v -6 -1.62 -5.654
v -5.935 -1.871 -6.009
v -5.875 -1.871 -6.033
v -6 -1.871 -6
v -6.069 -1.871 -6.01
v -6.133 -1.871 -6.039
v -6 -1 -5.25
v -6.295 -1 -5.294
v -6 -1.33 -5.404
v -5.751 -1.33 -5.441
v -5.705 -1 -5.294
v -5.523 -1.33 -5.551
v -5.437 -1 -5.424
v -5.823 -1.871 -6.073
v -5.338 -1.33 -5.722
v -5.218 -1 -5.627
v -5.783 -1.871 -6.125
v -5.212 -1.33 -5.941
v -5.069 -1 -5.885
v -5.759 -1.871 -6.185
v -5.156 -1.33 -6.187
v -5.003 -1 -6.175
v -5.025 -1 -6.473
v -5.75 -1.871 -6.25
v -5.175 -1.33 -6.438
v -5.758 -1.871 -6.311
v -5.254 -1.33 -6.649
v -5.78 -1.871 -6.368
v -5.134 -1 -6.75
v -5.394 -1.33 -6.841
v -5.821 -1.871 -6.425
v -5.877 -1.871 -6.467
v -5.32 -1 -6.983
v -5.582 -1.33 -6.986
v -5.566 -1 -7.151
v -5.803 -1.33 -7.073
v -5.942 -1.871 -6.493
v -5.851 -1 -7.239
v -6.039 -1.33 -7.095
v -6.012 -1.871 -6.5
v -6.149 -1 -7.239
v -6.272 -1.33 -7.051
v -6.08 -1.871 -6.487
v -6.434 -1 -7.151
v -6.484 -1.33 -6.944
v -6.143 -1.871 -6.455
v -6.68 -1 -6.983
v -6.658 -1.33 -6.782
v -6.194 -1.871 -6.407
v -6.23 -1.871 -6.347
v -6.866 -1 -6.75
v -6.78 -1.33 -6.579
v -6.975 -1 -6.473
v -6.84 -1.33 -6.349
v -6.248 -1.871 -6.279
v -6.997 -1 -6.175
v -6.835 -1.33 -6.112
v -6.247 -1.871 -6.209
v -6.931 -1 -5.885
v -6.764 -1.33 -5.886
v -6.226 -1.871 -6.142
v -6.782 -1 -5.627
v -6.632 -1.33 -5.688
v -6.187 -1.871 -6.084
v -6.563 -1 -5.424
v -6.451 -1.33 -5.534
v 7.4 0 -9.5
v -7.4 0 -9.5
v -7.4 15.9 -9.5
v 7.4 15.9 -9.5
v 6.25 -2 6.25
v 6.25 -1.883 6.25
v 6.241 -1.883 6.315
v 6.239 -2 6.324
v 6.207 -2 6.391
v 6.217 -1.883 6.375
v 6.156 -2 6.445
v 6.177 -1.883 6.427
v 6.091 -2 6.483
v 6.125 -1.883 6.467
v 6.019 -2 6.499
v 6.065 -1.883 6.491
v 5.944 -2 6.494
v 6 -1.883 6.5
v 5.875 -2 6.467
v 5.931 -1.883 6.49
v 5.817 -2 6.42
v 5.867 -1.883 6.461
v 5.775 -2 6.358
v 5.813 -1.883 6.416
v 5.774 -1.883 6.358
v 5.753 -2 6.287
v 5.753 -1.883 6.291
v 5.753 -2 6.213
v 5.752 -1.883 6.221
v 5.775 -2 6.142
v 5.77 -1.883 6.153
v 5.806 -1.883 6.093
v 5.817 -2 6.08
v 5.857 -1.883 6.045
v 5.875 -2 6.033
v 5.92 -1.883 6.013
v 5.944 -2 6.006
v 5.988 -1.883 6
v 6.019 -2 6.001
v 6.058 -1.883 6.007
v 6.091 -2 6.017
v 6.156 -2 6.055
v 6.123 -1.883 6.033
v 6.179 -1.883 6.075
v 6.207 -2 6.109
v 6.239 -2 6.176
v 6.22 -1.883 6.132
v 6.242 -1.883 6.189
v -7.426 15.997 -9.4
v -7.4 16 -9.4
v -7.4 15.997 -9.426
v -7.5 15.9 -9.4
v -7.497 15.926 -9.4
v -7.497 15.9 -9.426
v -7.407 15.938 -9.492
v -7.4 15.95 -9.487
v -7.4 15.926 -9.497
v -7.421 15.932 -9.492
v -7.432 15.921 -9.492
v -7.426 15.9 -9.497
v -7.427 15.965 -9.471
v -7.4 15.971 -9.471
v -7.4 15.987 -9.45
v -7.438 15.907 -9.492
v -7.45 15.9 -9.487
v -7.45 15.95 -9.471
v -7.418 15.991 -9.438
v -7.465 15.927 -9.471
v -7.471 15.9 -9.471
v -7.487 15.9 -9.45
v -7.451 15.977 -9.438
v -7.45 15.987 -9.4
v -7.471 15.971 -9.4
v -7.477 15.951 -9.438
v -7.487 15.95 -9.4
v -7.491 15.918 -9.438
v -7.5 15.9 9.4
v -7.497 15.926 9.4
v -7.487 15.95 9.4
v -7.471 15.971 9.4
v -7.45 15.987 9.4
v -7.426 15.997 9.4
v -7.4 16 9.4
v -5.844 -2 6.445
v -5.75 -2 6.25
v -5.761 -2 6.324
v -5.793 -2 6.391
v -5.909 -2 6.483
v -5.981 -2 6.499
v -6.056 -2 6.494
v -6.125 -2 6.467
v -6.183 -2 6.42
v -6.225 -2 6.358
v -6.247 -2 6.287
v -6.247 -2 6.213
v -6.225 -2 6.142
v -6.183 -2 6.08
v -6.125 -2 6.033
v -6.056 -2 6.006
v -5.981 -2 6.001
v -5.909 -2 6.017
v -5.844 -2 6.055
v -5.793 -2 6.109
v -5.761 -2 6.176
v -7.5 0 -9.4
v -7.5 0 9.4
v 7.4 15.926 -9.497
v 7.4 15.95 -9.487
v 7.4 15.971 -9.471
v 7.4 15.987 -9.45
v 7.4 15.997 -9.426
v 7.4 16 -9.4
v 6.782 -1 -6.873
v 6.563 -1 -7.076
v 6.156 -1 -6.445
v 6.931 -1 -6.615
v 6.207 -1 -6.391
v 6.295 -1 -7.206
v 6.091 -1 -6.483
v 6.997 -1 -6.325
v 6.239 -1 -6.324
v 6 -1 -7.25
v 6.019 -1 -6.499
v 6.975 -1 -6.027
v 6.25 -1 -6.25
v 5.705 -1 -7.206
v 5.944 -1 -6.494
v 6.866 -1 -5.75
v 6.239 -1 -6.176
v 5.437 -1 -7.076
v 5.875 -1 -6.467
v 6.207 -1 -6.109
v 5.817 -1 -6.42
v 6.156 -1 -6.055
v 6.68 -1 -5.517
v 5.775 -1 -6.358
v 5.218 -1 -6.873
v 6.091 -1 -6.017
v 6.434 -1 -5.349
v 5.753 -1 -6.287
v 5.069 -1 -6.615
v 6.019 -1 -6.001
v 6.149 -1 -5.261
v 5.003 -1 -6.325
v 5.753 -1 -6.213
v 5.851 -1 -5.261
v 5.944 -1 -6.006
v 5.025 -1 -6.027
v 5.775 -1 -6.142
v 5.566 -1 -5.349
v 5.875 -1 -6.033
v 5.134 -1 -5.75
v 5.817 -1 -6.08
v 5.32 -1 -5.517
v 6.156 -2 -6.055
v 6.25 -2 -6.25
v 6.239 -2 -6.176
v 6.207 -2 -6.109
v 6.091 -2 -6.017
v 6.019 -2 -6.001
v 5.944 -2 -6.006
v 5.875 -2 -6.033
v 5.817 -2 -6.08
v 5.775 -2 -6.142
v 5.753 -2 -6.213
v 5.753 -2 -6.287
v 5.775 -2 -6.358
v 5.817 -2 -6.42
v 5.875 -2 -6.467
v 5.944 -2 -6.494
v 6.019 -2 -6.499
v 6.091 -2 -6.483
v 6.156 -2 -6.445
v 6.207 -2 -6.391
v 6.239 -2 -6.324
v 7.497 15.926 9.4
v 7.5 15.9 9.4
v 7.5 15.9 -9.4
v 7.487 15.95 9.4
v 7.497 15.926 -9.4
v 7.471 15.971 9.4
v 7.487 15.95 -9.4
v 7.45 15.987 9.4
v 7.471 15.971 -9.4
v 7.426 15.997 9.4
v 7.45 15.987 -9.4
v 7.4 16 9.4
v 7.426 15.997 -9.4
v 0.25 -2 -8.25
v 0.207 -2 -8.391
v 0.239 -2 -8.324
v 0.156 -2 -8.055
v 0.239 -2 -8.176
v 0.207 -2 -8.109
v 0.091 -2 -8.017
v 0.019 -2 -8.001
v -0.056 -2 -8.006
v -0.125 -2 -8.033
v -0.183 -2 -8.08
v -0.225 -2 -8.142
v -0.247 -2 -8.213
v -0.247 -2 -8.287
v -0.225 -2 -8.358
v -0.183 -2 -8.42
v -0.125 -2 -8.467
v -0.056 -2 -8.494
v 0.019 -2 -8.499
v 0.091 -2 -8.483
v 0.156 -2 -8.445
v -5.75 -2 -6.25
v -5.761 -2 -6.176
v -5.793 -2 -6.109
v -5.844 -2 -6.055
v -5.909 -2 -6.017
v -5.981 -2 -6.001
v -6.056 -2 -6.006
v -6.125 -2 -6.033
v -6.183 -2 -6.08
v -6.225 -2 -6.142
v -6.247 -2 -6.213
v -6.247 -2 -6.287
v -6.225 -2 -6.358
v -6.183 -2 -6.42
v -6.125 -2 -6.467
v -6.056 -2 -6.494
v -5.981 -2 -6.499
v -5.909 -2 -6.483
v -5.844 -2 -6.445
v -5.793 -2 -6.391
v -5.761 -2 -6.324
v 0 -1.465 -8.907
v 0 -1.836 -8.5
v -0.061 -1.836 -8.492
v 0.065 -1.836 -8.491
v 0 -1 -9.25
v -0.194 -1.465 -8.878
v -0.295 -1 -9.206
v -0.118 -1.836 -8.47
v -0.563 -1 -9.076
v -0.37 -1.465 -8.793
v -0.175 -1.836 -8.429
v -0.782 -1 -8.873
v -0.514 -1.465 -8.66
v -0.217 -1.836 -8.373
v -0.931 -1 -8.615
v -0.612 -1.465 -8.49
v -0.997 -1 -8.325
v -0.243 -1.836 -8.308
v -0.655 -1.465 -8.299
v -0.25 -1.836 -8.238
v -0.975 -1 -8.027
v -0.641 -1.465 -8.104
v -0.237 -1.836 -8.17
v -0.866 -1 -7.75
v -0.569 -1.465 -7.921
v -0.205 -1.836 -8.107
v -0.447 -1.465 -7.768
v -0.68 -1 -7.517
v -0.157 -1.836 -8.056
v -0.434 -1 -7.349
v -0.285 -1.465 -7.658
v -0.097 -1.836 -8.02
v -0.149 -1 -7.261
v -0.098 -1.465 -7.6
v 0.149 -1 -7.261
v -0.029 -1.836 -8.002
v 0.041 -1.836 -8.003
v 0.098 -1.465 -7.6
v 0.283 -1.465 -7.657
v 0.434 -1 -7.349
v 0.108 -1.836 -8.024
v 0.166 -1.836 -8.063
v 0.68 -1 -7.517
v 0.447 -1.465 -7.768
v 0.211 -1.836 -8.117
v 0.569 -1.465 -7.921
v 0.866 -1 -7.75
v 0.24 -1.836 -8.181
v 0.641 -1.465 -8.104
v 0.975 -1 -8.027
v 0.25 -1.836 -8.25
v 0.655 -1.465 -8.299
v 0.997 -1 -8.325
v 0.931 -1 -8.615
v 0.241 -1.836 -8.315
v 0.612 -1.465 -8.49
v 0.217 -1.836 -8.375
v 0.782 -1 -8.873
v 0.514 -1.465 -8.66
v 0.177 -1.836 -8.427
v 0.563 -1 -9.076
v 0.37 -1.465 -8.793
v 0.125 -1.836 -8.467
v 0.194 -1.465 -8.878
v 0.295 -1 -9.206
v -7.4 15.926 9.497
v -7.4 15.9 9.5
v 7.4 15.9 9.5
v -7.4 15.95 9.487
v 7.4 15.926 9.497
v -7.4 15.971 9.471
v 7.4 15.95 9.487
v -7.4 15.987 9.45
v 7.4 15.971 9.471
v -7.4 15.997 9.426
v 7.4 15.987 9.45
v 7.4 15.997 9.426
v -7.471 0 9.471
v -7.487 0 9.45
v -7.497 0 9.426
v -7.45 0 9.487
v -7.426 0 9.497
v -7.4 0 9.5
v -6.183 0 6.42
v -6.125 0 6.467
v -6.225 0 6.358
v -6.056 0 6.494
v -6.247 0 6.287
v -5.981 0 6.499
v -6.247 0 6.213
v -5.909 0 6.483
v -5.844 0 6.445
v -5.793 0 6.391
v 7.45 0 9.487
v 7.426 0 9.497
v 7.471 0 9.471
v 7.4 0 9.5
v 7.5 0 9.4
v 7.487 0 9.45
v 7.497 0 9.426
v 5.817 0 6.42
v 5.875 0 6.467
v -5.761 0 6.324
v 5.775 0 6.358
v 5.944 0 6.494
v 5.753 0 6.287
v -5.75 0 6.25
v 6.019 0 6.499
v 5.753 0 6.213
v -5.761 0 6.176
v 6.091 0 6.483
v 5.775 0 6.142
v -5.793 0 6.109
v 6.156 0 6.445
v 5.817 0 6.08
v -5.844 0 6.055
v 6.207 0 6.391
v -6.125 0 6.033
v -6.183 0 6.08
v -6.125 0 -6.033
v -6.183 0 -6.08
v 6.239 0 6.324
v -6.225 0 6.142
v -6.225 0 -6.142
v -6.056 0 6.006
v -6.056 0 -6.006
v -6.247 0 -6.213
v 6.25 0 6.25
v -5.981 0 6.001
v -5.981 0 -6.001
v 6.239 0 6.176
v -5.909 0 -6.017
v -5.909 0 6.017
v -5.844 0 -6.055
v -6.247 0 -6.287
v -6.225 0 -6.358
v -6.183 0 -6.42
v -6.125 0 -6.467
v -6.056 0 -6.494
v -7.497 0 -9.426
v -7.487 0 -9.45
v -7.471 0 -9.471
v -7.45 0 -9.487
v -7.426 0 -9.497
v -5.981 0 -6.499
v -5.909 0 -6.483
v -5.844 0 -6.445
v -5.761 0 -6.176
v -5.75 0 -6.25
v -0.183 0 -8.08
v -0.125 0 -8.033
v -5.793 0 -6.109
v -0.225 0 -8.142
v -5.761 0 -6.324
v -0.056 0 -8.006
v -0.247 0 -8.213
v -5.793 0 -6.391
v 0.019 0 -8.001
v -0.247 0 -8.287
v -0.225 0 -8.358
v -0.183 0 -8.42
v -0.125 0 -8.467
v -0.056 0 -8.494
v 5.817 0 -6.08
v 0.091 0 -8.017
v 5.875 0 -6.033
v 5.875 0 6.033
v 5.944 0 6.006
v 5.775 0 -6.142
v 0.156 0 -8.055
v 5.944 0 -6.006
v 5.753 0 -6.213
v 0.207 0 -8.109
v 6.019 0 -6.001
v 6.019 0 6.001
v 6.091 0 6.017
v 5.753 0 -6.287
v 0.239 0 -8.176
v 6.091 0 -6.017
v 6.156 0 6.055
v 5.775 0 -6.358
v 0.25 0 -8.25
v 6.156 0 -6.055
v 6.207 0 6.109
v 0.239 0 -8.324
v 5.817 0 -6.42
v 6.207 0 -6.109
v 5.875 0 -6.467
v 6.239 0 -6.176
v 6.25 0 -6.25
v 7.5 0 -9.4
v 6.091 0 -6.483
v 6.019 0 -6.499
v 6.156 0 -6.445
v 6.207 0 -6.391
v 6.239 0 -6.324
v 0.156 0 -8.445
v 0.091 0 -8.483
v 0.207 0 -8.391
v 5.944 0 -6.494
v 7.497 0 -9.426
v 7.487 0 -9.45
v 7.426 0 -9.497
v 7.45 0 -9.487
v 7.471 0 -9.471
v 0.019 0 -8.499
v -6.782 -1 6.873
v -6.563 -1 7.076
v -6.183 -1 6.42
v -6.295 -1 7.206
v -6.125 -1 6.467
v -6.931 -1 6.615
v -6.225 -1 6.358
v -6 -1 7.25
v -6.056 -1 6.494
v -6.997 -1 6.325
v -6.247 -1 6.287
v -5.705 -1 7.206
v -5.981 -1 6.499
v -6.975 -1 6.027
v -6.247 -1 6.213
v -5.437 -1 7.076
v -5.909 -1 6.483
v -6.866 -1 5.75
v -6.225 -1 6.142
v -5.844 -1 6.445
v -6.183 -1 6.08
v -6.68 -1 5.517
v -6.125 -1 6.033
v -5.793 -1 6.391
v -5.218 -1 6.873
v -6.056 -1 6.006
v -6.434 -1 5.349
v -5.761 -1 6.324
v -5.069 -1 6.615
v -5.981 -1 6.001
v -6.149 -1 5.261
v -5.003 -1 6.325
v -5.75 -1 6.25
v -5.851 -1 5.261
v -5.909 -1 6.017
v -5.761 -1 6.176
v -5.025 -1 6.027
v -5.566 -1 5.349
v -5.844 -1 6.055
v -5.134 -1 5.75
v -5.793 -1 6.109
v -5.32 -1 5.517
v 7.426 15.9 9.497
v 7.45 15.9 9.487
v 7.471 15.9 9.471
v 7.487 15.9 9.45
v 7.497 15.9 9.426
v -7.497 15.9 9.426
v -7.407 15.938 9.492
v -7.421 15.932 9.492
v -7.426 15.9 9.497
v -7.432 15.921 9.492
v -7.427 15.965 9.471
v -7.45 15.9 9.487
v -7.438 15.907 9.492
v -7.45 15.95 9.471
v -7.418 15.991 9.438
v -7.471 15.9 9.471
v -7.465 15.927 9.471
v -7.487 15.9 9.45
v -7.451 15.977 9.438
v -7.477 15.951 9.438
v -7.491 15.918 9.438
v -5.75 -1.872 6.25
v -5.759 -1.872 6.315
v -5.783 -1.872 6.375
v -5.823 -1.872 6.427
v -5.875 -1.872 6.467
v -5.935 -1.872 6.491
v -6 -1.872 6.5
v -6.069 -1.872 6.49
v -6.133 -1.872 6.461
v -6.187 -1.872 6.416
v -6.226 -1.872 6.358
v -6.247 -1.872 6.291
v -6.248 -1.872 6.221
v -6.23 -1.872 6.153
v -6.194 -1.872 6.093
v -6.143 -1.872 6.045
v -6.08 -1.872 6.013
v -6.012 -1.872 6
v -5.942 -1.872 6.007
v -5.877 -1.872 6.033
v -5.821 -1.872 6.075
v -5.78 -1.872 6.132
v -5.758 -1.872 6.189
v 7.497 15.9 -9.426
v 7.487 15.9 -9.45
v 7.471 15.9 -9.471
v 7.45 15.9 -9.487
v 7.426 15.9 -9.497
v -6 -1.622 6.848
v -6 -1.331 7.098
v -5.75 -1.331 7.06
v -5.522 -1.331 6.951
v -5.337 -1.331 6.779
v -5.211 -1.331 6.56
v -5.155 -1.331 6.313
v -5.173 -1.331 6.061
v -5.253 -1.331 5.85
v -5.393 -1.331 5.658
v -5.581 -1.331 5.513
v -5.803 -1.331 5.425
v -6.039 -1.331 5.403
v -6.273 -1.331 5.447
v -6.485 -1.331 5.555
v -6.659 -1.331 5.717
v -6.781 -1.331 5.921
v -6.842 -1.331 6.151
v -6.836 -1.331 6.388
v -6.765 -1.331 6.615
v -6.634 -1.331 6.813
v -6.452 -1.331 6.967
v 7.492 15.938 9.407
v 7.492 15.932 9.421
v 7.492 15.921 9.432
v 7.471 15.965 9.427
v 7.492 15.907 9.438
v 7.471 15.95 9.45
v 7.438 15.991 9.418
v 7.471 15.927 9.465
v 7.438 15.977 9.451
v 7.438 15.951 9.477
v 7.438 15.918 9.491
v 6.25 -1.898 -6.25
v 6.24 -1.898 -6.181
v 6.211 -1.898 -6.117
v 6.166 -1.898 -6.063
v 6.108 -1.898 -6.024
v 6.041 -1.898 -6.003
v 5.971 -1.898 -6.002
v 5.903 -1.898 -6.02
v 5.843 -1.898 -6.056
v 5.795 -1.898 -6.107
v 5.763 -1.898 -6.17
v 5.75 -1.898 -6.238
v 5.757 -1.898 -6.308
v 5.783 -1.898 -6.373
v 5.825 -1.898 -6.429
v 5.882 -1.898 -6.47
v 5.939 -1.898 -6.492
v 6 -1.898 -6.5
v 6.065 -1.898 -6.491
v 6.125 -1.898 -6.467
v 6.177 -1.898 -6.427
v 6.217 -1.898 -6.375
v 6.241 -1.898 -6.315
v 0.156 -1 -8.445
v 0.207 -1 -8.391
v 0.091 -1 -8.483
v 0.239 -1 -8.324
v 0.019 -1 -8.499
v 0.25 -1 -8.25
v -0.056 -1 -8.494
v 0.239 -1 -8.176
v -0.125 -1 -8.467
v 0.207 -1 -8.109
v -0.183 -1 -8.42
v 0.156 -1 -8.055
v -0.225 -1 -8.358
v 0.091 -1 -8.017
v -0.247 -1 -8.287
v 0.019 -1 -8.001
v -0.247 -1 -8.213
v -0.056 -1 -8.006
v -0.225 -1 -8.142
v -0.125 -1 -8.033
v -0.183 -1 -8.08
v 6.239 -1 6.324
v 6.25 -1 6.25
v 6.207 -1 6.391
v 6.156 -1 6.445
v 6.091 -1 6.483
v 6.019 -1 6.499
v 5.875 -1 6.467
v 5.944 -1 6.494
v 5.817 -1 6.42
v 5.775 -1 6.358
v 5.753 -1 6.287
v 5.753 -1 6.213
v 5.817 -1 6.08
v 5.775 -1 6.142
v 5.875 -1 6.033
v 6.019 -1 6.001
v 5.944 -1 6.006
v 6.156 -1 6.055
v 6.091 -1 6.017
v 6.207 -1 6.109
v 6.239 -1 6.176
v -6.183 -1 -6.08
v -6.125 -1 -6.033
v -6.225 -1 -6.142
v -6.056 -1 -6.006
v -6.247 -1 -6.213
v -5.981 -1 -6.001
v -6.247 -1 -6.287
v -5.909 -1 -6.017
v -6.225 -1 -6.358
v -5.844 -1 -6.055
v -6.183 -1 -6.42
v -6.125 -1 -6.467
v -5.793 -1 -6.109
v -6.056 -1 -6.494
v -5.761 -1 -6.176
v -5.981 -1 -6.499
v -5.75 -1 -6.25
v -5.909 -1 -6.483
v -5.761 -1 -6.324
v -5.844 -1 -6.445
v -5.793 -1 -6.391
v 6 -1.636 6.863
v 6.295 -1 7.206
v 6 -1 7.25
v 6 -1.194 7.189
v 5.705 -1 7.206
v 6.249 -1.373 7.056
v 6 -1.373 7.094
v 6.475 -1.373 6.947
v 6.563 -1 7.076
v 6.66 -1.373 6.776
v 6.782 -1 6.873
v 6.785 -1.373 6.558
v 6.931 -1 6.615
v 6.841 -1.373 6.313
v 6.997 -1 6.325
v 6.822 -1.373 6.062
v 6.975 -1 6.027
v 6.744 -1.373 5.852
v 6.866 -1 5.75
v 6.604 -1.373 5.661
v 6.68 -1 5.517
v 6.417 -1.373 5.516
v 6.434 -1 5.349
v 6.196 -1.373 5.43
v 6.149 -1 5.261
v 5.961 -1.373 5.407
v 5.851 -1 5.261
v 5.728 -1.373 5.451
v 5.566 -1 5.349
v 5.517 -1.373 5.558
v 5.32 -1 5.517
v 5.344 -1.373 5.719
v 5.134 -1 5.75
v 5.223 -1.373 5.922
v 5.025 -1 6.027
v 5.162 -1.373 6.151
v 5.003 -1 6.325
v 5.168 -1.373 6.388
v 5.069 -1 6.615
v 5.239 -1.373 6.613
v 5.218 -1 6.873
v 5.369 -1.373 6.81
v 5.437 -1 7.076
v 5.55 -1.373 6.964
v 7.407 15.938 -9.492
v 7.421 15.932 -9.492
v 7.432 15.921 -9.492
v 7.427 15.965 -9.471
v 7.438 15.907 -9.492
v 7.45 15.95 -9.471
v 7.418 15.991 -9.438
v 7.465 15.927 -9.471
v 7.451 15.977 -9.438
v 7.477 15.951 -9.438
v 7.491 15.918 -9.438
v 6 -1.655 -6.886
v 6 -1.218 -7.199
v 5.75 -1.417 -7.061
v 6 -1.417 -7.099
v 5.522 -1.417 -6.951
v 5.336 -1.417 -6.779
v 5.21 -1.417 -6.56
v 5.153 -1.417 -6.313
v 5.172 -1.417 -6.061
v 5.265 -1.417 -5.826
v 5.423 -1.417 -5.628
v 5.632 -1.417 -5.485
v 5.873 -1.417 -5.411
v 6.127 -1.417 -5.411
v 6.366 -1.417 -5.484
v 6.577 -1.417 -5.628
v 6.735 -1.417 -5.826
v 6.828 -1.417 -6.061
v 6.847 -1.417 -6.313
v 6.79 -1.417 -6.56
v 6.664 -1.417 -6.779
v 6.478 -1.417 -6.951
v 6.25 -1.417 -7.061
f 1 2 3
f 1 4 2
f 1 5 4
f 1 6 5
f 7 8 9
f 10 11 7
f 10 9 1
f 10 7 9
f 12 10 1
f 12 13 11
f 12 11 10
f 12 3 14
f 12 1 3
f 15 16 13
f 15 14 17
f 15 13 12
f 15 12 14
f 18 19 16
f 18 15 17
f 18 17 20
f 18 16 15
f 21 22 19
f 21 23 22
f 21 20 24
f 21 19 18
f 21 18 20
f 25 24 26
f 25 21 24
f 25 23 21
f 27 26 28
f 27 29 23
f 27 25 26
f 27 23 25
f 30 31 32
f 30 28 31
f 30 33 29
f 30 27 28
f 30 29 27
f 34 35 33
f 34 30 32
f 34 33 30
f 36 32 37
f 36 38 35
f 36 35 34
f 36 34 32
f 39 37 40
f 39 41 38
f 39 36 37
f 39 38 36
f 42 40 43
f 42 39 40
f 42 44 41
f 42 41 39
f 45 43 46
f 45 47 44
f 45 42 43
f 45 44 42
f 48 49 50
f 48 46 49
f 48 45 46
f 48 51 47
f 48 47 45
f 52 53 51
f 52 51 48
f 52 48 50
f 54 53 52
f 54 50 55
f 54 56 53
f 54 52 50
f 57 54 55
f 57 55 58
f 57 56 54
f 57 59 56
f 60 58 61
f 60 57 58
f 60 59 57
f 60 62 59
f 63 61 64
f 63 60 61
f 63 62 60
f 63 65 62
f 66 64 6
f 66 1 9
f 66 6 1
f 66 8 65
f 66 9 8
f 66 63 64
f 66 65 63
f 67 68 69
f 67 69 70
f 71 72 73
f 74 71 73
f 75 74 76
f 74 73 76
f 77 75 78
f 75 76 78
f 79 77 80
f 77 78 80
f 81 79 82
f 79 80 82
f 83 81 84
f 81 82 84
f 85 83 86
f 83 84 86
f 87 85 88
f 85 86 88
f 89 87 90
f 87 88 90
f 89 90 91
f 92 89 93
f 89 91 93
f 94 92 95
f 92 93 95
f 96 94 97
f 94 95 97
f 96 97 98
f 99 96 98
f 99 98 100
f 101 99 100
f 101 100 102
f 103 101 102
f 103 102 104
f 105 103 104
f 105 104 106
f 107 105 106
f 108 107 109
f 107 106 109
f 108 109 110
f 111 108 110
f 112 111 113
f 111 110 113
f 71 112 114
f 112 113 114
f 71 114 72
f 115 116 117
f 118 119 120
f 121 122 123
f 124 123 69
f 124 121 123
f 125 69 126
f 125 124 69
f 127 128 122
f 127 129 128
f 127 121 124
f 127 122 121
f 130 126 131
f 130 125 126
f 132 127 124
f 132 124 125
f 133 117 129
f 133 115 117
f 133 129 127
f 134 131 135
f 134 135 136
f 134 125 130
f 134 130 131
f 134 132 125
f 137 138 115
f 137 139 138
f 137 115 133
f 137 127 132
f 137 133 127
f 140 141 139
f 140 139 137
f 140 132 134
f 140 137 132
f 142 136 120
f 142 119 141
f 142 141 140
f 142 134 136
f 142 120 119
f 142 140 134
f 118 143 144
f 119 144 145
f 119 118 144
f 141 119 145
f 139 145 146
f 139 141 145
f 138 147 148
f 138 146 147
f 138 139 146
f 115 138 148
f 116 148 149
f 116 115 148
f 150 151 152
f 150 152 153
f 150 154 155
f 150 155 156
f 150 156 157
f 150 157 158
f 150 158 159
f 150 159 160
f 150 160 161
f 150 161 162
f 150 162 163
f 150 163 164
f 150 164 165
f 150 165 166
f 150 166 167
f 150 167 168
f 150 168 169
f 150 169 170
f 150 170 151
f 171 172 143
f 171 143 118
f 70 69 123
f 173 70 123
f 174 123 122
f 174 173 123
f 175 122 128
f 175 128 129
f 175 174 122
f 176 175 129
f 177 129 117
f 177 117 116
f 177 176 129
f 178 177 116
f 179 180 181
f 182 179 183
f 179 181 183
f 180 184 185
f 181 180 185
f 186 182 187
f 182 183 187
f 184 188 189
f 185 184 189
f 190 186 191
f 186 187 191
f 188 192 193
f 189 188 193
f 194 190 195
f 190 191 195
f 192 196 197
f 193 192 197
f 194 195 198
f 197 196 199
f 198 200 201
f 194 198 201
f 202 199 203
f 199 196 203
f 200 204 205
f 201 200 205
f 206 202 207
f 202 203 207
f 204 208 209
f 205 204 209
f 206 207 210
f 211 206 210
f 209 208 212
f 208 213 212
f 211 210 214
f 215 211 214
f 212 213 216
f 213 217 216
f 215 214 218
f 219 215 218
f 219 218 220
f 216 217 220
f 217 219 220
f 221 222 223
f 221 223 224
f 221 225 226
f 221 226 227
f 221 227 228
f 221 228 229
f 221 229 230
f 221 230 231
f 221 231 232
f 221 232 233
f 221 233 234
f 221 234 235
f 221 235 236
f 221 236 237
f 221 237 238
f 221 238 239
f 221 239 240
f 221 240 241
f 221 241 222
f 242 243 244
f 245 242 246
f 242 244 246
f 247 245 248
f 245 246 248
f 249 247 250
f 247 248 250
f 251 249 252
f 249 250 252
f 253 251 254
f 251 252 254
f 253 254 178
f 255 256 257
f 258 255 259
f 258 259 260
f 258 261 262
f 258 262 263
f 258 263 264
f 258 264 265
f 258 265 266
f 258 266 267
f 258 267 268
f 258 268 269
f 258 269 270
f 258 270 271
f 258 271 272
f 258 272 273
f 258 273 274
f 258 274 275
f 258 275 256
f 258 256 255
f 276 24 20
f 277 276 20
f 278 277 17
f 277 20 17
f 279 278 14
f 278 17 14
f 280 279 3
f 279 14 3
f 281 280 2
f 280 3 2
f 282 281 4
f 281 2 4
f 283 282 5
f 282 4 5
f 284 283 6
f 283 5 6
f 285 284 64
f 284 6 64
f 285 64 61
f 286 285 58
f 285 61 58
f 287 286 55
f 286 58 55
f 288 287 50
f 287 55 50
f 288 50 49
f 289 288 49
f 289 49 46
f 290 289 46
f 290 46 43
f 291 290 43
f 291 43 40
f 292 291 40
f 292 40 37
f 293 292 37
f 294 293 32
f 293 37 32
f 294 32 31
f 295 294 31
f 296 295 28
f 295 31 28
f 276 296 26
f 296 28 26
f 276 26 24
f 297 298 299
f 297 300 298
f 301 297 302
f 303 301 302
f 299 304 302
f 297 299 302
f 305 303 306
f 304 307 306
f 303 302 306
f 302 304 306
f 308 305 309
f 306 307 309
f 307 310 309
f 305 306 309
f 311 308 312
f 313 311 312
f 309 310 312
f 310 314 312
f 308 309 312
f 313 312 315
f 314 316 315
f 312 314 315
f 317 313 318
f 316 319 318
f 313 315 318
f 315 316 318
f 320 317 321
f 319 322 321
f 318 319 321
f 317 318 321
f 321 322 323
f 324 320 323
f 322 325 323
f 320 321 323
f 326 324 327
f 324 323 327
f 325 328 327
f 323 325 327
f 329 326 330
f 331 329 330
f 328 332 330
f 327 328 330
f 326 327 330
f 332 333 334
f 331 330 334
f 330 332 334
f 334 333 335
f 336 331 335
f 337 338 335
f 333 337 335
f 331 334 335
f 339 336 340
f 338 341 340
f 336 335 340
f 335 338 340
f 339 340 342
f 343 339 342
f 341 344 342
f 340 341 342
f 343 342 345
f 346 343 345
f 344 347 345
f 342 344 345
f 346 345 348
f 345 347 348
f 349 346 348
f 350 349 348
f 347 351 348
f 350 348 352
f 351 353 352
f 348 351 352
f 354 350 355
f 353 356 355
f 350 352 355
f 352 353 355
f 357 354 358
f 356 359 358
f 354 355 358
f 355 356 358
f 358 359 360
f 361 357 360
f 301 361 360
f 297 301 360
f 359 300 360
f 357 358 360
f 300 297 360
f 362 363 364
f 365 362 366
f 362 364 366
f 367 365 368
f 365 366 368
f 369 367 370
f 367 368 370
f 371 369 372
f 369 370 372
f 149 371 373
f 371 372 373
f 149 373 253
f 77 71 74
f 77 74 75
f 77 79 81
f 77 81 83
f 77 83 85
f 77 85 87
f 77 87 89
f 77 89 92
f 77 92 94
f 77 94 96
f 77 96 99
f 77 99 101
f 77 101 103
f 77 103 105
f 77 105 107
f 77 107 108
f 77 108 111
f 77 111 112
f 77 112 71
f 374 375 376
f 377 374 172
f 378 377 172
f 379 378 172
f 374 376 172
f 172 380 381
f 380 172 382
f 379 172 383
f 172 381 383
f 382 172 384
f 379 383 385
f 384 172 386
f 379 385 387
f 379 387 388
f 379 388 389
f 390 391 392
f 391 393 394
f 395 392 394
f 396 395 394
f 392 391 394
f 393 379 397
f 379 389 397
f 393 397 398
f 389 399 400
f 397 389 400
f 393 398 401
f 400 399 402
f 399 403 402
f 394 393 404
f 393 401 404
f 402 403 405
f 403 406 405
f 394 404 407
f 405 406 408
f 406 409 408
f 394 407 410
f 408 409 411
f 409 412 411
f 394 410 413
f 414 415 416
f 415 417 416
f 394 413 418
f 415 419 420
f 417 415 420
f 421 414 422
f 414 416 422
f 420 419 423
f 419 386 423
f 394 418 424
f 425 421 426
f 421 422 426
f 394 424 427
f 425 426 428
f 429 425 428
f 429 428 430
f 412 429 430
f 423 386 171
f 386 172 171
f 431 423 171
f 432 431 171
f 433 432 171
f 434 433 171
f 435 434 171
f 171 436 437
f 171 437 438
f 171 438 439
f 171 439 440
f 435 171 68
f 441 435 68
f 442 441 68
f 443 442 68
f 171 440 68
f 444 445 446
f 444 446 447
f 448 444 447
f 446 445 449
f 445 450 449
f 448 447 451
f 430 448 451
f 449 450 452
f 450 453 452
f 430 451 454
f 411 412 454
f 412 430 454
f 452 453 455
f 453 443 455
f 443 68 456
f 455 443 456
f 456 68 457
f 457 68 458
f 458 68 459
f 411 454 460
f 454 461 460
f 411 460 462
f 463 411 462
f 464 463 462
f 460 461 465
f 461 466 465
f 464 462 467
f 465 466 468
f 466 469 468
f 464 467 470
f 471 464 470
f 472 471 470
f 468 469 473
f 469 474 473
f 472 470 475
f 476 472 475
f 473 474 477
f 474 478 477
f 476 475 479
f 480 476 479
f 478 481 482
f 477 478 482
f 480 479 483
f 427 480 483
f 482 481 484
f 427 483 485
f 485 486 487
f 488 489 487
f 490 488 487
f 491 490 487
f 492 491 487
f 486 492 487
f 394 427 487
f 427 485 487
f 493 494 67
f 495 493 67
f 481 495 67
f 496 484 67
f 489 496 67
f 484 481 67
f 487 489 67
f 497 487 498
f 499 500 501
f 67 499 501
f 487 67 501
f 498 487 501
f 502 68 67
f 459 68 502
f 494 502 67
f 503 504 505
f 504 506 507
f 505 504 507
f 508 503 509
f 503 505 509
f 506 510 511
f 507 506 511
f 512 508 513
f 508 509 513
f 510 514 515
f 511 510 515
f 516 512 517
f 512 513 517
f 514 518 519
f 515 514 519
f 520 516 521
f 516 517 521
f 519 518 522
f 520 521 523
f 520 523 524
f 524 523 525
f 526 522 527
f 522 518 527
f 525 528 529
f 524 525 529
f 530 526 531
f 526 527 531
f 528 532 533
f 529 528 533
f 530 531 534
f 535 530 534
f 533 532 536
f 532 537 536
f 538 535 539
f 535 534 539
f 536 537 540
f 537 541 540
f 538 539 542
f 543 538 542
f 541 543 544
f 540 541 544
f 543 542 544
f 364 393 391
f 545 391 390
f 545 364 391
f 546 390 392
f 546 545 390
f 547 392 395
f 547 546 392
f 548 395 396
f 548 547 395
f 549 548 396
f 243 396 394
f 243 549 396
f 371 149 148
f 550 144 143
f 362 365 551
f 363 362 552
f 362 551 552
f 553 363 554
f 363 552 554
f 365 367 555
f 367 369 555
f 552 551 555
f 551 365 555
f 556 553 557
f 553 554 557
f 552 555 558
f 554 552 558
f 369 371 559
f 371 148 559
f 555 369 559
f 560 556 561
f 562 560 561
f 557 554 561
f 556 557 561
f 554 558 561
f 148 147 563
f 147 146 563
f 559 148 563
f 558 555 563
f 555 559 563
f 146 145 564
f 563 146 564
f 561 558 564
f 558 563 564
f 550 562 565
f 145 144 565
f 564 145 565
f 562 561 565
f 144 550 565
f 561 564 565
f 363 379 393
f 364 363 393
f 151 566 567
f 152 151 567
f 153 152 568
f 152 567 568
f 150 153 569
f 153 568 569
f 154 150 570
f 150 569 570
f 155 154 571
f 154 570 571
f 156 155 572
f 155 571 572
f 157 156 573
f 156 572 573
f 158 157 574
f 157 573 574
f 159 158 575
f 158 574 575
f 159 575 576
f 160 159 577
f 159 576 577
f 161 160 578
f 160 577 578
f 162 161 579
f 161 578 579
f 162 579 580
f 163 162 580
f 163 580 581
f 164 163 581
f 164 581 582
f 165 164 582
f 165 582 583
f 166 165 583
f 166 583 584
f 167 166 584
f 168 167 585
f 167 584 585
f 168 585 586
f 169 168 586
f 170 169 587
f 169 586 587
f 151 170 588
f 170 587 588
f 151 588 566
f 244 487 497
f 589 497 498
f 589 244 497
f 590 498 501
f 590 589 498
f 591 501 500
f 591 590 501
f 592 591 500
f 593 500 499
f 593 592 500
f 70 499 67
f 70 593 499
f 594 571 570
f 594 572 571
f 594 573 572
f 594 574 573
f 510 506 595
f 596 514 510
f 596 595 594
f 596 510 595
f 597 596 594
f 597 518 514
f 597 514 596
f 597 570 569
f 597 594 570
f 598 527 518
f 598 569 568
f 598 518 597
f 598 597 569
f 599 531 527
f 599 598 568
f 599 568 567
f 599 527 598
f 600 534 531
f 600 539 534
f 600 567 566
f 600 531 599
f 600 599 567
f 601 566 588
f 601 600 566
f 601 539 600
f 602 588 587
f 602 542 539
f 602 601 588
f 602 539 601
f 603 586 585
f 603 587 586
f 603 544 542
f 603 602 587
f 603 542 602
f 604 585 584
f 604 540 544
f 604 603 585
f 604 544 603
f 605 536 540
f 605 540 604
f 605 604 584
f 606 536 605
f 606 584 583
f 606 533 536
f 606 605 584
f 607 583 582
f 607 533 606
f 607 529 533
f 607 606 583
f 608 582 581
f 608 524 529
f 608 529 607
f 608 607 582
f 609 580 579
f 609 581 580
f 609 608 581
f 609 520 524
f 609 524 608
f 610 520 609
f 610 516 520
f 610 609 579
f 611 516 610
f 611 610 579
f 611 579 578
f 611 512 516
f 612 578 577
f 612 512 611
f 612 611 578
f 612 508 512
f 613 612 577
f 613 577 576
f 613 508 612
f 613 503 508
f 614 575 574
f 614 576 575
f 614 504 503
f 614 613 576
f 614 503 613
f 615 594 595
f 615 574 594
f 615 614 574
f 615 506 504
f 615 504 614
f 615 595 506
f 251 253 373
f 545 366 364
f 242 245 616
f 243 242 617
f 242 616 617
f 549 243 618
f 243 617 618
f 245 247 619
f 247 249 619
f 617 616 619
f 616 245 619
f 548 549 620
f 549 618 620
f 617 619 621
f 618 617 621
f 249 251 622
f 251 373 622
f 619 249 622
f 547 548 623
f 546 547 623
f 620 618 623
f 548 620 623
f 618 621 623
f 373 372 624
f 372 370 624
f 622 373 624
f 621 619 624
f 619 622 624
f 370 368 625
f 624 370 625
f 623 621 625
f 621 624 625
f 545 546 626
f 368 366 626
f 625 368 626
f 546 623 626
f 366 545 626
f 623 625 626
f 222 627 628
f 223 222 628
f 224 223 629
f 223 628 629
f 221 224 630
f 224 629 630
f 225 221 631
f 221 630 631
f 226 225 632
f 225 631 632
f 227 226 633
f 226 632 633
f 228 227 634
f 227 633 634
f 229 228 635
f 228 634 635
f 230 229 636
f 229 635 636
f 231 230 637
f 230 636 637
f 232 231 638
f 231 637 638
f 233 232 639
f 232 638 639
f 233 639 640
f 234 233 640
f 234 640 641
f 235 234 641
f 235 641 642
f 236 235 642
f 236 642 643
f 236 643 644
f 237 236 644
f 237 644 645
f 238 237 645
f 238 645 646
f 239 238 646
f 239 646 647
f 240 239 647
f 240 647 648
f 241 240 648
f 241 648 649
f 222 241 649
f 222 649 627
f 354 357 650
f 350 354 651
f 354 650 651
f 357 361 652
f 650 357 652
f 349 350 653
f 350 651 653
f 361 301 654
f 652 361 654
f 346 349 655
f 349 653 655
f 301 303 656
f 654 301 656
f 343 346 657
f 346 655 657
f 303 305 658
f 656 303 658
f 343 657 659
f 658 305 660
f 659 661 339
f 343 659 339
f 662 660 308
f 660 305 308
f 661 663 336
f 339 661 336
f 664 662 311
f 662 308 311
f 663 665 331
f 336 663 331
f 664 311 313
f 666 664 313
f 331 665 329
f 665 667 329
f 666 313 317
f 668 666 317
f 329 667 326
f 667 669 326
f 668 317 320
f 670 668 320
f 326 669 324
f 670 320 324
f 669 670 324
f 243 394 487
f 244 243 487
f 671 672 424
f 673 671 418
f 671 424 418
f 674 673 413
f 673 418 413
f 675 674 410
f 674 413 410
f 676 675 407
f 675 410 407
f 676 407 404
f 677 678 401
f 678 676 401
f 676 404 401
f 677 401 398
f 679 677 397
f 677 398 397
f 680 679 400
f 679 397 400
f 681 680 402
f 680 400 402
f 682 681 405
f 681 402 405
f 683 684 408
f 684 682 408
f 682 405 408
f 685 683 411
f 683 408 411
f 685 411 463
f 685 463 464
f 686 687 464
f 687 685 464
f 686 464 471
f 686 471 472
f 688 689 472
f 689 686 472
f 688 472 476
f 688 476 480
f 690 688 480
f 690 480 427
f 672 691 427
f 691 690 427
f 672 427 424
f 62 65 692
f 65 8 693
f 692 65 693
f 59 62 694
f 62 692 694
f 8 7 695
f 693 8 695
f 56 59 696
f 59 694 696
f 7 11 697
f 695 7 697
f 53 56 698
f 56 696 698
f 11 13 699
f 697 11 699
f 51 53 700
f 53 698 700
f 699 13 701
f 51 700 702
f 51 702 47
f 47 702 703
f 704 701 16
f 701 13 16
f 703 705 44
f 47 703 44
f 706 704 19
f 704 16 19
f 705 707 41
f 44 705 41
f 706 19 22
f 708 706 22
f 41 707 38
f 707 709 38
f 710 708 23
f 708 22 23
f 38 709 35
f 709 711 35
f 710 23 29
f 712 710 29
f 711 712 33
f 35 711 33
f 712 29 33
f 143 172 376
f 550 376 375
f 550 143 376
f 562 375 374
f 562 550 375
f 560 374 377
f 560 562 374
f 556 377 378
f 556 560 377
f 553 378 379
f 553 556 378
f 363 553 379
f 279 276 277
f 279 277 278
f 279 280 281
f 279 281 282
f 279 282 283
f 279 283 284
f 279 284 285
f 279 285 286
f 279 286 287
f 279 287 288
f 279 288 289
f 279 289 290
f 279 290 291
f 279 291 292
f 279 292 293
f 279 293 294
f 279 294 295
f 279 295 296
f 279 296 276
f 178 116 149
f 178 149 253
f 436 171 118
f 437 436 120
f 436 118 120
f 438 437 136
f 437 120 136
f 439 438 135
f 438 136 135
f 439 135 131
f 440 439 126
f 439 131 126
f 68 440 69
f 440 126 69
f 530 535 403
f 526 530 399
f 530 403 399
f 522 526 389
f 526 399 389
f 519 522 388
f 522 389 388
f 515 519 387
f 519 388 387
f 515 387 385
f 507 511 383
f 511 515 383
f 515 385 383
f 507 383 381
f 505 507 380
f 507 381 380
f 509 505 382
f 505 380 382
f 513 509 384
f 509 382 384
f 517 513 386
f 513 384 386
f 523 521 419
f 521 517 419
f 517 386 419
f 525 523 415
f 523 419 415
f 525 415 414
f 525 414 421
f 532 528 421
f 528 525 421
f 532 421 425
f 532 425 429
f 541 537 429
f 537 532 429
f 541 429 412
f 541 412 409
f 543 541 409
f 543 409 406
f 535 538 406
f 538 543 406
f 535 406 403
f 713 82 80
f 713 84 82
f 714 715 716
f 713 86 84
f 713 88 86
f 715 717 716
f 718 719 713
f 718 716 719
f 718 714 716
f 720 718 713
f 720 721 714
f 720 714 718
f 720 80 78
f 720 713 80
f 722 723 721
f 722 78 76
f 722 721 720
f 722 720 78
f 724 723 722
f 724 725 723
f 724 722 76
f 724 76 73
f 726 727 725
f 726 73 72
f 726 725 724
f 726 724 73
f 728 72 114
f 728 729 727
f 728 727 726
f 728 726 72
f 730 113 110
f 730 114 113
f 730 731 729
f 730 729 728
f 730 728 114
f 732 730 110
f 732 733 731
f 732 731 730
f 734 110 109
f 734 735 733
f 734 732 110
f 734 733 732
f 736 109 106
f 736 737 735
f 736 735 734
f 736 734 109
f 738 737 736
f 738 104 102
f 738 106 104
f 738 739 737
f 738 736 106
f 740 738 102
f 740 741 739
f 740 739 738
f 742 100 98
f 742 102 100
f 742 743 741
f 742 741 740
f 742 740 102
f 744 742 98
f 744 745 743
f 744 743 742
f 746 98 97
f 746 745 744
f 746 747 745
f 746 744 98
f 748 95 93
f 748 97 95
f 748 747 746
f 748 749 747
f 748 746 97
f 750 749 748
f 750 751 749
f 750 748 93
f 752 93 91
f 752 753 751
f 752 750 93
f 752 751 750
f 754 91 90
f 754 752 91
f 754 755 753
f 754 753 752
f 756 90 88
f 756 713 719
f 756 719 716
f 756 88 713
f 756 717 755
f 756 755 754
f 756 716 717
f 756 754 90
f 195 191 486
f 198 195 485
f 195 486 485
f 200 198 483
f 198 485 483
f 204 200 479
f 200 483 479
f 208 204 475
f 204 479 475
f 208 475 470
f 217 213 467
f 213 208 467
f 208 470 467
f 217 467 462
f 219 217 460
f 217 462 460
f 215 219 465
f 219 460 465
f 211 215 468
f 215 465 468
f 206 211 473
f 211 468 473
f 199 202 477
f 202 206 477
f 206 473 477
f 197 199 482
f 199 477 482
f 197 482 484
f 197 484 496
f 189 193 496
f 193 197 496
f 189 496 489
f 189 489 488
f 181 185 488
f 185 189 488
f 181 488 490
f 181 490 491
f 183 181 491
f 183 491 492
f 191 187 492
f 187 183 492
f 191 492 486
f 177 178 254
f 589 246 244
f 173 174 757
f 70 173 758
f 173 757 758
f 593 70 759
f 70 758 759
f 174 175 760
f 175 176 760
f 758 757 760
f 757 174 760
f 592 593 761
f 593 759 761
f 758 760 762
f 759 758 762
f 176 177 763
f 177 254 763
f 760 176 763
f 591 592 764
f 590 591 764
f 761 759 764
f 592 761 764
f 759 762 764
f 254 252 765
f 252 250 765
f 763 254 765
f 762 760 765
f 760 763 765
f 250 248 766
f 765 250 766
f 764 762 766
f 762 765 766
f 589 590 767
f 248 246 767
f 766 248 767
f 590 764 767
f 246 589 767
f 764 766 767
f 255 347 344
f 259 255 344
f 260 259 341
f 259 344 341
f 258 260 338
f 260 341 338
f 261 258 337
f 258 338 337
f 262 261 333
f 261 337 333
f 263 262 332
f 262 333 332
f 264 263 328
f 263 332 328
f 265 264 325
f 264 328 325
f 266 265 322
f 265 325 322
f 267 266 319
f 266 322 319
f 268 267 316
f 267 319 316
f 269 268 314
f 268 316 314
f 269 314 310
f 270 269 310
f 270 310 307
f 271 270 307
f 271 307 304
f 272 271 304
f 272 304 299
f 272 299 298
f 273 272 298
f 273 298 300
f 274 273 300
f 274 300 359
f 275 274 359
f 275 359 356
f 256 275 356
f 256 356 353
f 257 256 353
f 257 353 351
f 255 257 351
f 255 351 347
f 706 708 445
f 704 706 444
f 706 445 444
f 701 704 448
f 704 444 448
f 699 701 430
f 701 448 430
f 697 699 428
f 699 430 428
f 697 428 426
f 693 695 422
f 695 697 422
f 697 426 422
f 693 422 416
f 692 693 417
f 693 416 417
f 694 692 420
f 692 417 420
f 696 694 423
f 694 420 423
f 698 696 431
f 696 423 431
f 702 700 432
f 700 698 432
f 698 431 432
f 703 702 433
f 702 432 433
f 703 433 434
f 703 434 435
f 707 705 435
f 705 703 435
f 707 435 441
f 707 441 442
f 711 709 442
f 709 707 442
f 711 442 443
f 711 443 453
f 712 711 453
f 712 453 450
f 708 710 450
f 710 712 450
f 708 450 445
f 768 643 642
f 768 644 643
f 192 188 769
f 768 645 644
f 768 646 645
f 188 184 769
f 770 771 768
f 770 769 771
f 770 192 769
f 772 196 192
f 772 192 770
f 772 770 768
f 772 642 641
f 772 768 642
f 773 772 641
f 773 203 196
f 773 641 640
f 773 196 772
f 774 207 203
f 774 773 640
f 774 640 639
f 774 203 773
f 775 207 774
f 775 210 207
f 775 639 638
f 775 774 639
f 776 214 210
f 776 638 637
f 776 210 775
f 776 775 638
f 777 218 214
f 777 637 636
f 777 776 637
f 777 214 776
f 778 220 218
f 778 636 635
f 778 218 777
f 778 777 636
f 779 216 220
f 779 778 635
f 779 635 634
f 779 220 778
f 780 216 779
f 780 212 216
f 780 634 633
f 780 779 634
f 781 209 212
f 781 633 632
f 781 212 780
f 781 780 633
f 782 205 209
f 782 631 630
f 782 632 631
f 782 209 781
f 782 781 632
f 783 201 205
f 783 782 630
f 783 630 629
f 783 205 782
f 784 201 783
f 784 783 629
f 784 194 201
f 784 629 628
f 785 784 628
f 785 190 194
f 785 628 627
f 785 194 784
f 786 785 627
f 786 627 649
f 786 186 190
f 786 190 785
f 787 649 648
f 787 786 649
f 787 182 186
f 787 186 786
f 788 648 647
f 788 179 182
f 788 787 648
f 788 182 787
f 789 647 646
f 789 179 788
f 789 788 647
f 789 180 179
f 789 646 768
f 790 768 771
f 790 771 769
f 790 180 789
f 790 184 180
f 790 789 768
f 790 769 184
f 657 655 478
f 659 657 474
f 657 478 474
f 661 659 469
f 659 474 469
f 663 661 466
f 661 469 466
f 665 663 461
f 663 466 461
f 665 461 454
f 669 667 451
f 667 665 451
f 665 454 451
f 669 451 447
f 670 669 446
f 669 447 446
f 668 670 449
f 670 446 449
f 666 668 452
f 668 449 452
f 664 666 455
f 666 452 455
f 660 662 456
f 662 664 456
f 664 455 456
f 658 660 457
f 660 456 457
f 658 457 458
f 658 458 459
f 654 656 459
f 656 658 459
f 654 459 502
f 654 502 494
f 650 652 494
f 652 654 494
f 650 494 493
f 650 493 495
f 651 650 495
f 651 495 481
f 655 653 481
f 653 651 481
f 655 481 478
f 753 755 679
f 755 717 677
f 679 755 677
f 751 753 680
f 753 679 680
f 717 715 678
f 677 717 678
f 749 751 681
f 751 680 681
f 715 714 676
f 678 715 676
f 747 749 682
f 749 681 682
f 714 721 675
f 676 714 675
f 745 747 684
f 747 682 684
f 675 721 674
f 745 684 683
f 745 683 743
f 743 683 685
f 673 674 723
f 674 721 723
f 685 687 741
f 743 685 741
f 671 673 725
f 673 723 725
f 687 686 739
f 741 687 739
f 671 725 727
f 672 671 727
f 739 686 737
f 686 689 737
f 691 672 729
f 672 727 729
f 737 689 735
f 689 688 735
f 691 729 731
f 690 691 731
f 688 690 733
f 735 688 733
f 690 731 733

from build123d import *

# Parameters (mm, degrees)
IZIM1_W                     = 15
IZIM1_H                     = 19
Y_KSEKLIK_EKSTR_ZYON1_DEPTH = 16
RADYUS1_R                   = 0.1
IZIM2_R                     = 0.25
Y_KSEKLIK_EKSTR_ZYON2_DEPTH = 2


with BuildPart() as part:
    # Çizim1 → Yükseklik-Ekstrüzyon1 (new body)
    with BuildSketch(Plane(origin=(0, 0, 0), x_dir=(1, 0, 0), z_dir=(0, 1, 0))):
        Rectangle(IZIM1_W, IZIM1_H)
    extrude(amount=Y_KSEKLIK_EKSTR_ZYON1_DEPTH)

    # Radyus1
    radyus1_edges = [part.edges().sort_by_distance(p)[0] for p in [
        (-7.5, 16, 0),
        (0, 16, 9.5),
        (7.5, 16, 0),
        (0, 16, -9.5),
        (7.5, 8, 9.5),
        (-7.5, 8, 9.5),
        (-7.5, 8, -9.5),
        (7.5, 8, -9.5),
    ]]
    fillet(radyus1_edges, radius=RADYUS1_R)

    # Çizim2 → Yükseklik-Ekstrüzyon2 (add)
    with BuildSketch(Plane.XZ):
        with Locations((6, 6.25)):
            Circle(IZIM2_R)
        with Locations((-6, 6.25)):
            Circle(IZIM2_R)
        with Locations((6, -6.25)):
            Circle(IZIM2_R)
        with Locations((-6, -6.25)):
            Circle(IZIM2_R)
        with Locations((0, -8.25)):
            Circle(IZIM2_R)
    extrude(amount=Y_KSEKLIK_EKSTR_ZYON2_DEPTH)

    # Çizim3 → Döndür1 (revolve)
    with BuildSketch(Plane.ZY.offset(6)):
        with BuildLine():
            Line((-6.25, -2), (-6.25, -1))
            Line((-6.25, -1), (-5.25, -1))
            add(Edge.make_bspline(
                [(-6.25, -2), (-5.440038175, -1.628390392), (-5.25, -1)],
                knots=[0, 0, 0, 0.619923651, 0.619923651, 0.619923651], degree=2))
        make_face()
    revolve(axis=Axis((-6, -2, -6.25), (0, 1, 0)))

    # Çizim4 → Döndür2 (revolve)
    with BuildSketch(Plane.ZY.offset(6)):
        with BuildLine():
            Line((6.25, -2), (6.25, -1))
            Line((6.25, -1), (7.25, -1))
            add(Edge.make_bspline(
                [(6.25, -2), (7.064808885, -1.63039811), (7.25, -1)],
                knots=[0, 0, 0, 0.629617769, 0.629617769, 0.629617769], degree=2))
        make_face()
    revolve(axis=Axis((-6, -2, 6.25), (0, 1, 0)))

    # Çizim5 → Döndür3 (revolve)
    with BuildSketch(Plane(origin=(6, 0, 0), x_dir=(0, 0, -1), z_dir=(1, 0, 0))):
        with BuildLine():
            Line((-6.25, -2), (-6.25, -1))
            Line((-6.25, -1), (-7.25, -1))
            add(Edge.make_bspline(
                [(-6.25, -2), (-7.108302041, -1.648413565), (-7.25, -1)],
                knots=[0, 0, 0, 0.716604082, 0.716604082, 0.716604082], degree=2))
        make_face()
    revolve(axis=Axis((6, -2, 6.25), (0, 1, 0)))

    # Çizim6 → Döndür4 (revolve)
    with BuildSketch(Plane(origin=(6, 0, 0), x_dir=(0, 0, -1), z_dir=(1, 0, 0))):
        with BuildLine():
            Line((6.25, -2), (6.25, -1))
            Line((6.25, -1), (7.25, -1))
            add(Edge.make_bspline(
                [(6.25, -2), (7.16916064, -1.673622022), (7.25, -1)],
                knots=[0, 0, 0, 0.838321281, 0.838321281, 0.838321281], degree=2))
        make_face()
    revolve(axis=Axis((6, -2, -6.25), (0, 1, 0)))

    # Çizim7 → Döndür5 (revolve)
    with BuildSketch(Plane(origin=(0, 0, 0), x_dir=(0, 0, -1), z_dir=(1, 0, 0))):
        with BuildLine():
            Line((8.25, -2), (8.25, -1))
            Line((8.25, -1), (9.25, -1))
            add(Edge.make_bspline(
                [(9.25, -1), (8.854156938, -1.651239765), (8.25, -2)],
                knots=[0, 0, 0, 0.716230024, 0.716230024, 0.716230024], degree=2))
        make_face()
    revolve(axis=Axis((0, -2, -8.25), (0, 1, 0)))


solid = part.part
